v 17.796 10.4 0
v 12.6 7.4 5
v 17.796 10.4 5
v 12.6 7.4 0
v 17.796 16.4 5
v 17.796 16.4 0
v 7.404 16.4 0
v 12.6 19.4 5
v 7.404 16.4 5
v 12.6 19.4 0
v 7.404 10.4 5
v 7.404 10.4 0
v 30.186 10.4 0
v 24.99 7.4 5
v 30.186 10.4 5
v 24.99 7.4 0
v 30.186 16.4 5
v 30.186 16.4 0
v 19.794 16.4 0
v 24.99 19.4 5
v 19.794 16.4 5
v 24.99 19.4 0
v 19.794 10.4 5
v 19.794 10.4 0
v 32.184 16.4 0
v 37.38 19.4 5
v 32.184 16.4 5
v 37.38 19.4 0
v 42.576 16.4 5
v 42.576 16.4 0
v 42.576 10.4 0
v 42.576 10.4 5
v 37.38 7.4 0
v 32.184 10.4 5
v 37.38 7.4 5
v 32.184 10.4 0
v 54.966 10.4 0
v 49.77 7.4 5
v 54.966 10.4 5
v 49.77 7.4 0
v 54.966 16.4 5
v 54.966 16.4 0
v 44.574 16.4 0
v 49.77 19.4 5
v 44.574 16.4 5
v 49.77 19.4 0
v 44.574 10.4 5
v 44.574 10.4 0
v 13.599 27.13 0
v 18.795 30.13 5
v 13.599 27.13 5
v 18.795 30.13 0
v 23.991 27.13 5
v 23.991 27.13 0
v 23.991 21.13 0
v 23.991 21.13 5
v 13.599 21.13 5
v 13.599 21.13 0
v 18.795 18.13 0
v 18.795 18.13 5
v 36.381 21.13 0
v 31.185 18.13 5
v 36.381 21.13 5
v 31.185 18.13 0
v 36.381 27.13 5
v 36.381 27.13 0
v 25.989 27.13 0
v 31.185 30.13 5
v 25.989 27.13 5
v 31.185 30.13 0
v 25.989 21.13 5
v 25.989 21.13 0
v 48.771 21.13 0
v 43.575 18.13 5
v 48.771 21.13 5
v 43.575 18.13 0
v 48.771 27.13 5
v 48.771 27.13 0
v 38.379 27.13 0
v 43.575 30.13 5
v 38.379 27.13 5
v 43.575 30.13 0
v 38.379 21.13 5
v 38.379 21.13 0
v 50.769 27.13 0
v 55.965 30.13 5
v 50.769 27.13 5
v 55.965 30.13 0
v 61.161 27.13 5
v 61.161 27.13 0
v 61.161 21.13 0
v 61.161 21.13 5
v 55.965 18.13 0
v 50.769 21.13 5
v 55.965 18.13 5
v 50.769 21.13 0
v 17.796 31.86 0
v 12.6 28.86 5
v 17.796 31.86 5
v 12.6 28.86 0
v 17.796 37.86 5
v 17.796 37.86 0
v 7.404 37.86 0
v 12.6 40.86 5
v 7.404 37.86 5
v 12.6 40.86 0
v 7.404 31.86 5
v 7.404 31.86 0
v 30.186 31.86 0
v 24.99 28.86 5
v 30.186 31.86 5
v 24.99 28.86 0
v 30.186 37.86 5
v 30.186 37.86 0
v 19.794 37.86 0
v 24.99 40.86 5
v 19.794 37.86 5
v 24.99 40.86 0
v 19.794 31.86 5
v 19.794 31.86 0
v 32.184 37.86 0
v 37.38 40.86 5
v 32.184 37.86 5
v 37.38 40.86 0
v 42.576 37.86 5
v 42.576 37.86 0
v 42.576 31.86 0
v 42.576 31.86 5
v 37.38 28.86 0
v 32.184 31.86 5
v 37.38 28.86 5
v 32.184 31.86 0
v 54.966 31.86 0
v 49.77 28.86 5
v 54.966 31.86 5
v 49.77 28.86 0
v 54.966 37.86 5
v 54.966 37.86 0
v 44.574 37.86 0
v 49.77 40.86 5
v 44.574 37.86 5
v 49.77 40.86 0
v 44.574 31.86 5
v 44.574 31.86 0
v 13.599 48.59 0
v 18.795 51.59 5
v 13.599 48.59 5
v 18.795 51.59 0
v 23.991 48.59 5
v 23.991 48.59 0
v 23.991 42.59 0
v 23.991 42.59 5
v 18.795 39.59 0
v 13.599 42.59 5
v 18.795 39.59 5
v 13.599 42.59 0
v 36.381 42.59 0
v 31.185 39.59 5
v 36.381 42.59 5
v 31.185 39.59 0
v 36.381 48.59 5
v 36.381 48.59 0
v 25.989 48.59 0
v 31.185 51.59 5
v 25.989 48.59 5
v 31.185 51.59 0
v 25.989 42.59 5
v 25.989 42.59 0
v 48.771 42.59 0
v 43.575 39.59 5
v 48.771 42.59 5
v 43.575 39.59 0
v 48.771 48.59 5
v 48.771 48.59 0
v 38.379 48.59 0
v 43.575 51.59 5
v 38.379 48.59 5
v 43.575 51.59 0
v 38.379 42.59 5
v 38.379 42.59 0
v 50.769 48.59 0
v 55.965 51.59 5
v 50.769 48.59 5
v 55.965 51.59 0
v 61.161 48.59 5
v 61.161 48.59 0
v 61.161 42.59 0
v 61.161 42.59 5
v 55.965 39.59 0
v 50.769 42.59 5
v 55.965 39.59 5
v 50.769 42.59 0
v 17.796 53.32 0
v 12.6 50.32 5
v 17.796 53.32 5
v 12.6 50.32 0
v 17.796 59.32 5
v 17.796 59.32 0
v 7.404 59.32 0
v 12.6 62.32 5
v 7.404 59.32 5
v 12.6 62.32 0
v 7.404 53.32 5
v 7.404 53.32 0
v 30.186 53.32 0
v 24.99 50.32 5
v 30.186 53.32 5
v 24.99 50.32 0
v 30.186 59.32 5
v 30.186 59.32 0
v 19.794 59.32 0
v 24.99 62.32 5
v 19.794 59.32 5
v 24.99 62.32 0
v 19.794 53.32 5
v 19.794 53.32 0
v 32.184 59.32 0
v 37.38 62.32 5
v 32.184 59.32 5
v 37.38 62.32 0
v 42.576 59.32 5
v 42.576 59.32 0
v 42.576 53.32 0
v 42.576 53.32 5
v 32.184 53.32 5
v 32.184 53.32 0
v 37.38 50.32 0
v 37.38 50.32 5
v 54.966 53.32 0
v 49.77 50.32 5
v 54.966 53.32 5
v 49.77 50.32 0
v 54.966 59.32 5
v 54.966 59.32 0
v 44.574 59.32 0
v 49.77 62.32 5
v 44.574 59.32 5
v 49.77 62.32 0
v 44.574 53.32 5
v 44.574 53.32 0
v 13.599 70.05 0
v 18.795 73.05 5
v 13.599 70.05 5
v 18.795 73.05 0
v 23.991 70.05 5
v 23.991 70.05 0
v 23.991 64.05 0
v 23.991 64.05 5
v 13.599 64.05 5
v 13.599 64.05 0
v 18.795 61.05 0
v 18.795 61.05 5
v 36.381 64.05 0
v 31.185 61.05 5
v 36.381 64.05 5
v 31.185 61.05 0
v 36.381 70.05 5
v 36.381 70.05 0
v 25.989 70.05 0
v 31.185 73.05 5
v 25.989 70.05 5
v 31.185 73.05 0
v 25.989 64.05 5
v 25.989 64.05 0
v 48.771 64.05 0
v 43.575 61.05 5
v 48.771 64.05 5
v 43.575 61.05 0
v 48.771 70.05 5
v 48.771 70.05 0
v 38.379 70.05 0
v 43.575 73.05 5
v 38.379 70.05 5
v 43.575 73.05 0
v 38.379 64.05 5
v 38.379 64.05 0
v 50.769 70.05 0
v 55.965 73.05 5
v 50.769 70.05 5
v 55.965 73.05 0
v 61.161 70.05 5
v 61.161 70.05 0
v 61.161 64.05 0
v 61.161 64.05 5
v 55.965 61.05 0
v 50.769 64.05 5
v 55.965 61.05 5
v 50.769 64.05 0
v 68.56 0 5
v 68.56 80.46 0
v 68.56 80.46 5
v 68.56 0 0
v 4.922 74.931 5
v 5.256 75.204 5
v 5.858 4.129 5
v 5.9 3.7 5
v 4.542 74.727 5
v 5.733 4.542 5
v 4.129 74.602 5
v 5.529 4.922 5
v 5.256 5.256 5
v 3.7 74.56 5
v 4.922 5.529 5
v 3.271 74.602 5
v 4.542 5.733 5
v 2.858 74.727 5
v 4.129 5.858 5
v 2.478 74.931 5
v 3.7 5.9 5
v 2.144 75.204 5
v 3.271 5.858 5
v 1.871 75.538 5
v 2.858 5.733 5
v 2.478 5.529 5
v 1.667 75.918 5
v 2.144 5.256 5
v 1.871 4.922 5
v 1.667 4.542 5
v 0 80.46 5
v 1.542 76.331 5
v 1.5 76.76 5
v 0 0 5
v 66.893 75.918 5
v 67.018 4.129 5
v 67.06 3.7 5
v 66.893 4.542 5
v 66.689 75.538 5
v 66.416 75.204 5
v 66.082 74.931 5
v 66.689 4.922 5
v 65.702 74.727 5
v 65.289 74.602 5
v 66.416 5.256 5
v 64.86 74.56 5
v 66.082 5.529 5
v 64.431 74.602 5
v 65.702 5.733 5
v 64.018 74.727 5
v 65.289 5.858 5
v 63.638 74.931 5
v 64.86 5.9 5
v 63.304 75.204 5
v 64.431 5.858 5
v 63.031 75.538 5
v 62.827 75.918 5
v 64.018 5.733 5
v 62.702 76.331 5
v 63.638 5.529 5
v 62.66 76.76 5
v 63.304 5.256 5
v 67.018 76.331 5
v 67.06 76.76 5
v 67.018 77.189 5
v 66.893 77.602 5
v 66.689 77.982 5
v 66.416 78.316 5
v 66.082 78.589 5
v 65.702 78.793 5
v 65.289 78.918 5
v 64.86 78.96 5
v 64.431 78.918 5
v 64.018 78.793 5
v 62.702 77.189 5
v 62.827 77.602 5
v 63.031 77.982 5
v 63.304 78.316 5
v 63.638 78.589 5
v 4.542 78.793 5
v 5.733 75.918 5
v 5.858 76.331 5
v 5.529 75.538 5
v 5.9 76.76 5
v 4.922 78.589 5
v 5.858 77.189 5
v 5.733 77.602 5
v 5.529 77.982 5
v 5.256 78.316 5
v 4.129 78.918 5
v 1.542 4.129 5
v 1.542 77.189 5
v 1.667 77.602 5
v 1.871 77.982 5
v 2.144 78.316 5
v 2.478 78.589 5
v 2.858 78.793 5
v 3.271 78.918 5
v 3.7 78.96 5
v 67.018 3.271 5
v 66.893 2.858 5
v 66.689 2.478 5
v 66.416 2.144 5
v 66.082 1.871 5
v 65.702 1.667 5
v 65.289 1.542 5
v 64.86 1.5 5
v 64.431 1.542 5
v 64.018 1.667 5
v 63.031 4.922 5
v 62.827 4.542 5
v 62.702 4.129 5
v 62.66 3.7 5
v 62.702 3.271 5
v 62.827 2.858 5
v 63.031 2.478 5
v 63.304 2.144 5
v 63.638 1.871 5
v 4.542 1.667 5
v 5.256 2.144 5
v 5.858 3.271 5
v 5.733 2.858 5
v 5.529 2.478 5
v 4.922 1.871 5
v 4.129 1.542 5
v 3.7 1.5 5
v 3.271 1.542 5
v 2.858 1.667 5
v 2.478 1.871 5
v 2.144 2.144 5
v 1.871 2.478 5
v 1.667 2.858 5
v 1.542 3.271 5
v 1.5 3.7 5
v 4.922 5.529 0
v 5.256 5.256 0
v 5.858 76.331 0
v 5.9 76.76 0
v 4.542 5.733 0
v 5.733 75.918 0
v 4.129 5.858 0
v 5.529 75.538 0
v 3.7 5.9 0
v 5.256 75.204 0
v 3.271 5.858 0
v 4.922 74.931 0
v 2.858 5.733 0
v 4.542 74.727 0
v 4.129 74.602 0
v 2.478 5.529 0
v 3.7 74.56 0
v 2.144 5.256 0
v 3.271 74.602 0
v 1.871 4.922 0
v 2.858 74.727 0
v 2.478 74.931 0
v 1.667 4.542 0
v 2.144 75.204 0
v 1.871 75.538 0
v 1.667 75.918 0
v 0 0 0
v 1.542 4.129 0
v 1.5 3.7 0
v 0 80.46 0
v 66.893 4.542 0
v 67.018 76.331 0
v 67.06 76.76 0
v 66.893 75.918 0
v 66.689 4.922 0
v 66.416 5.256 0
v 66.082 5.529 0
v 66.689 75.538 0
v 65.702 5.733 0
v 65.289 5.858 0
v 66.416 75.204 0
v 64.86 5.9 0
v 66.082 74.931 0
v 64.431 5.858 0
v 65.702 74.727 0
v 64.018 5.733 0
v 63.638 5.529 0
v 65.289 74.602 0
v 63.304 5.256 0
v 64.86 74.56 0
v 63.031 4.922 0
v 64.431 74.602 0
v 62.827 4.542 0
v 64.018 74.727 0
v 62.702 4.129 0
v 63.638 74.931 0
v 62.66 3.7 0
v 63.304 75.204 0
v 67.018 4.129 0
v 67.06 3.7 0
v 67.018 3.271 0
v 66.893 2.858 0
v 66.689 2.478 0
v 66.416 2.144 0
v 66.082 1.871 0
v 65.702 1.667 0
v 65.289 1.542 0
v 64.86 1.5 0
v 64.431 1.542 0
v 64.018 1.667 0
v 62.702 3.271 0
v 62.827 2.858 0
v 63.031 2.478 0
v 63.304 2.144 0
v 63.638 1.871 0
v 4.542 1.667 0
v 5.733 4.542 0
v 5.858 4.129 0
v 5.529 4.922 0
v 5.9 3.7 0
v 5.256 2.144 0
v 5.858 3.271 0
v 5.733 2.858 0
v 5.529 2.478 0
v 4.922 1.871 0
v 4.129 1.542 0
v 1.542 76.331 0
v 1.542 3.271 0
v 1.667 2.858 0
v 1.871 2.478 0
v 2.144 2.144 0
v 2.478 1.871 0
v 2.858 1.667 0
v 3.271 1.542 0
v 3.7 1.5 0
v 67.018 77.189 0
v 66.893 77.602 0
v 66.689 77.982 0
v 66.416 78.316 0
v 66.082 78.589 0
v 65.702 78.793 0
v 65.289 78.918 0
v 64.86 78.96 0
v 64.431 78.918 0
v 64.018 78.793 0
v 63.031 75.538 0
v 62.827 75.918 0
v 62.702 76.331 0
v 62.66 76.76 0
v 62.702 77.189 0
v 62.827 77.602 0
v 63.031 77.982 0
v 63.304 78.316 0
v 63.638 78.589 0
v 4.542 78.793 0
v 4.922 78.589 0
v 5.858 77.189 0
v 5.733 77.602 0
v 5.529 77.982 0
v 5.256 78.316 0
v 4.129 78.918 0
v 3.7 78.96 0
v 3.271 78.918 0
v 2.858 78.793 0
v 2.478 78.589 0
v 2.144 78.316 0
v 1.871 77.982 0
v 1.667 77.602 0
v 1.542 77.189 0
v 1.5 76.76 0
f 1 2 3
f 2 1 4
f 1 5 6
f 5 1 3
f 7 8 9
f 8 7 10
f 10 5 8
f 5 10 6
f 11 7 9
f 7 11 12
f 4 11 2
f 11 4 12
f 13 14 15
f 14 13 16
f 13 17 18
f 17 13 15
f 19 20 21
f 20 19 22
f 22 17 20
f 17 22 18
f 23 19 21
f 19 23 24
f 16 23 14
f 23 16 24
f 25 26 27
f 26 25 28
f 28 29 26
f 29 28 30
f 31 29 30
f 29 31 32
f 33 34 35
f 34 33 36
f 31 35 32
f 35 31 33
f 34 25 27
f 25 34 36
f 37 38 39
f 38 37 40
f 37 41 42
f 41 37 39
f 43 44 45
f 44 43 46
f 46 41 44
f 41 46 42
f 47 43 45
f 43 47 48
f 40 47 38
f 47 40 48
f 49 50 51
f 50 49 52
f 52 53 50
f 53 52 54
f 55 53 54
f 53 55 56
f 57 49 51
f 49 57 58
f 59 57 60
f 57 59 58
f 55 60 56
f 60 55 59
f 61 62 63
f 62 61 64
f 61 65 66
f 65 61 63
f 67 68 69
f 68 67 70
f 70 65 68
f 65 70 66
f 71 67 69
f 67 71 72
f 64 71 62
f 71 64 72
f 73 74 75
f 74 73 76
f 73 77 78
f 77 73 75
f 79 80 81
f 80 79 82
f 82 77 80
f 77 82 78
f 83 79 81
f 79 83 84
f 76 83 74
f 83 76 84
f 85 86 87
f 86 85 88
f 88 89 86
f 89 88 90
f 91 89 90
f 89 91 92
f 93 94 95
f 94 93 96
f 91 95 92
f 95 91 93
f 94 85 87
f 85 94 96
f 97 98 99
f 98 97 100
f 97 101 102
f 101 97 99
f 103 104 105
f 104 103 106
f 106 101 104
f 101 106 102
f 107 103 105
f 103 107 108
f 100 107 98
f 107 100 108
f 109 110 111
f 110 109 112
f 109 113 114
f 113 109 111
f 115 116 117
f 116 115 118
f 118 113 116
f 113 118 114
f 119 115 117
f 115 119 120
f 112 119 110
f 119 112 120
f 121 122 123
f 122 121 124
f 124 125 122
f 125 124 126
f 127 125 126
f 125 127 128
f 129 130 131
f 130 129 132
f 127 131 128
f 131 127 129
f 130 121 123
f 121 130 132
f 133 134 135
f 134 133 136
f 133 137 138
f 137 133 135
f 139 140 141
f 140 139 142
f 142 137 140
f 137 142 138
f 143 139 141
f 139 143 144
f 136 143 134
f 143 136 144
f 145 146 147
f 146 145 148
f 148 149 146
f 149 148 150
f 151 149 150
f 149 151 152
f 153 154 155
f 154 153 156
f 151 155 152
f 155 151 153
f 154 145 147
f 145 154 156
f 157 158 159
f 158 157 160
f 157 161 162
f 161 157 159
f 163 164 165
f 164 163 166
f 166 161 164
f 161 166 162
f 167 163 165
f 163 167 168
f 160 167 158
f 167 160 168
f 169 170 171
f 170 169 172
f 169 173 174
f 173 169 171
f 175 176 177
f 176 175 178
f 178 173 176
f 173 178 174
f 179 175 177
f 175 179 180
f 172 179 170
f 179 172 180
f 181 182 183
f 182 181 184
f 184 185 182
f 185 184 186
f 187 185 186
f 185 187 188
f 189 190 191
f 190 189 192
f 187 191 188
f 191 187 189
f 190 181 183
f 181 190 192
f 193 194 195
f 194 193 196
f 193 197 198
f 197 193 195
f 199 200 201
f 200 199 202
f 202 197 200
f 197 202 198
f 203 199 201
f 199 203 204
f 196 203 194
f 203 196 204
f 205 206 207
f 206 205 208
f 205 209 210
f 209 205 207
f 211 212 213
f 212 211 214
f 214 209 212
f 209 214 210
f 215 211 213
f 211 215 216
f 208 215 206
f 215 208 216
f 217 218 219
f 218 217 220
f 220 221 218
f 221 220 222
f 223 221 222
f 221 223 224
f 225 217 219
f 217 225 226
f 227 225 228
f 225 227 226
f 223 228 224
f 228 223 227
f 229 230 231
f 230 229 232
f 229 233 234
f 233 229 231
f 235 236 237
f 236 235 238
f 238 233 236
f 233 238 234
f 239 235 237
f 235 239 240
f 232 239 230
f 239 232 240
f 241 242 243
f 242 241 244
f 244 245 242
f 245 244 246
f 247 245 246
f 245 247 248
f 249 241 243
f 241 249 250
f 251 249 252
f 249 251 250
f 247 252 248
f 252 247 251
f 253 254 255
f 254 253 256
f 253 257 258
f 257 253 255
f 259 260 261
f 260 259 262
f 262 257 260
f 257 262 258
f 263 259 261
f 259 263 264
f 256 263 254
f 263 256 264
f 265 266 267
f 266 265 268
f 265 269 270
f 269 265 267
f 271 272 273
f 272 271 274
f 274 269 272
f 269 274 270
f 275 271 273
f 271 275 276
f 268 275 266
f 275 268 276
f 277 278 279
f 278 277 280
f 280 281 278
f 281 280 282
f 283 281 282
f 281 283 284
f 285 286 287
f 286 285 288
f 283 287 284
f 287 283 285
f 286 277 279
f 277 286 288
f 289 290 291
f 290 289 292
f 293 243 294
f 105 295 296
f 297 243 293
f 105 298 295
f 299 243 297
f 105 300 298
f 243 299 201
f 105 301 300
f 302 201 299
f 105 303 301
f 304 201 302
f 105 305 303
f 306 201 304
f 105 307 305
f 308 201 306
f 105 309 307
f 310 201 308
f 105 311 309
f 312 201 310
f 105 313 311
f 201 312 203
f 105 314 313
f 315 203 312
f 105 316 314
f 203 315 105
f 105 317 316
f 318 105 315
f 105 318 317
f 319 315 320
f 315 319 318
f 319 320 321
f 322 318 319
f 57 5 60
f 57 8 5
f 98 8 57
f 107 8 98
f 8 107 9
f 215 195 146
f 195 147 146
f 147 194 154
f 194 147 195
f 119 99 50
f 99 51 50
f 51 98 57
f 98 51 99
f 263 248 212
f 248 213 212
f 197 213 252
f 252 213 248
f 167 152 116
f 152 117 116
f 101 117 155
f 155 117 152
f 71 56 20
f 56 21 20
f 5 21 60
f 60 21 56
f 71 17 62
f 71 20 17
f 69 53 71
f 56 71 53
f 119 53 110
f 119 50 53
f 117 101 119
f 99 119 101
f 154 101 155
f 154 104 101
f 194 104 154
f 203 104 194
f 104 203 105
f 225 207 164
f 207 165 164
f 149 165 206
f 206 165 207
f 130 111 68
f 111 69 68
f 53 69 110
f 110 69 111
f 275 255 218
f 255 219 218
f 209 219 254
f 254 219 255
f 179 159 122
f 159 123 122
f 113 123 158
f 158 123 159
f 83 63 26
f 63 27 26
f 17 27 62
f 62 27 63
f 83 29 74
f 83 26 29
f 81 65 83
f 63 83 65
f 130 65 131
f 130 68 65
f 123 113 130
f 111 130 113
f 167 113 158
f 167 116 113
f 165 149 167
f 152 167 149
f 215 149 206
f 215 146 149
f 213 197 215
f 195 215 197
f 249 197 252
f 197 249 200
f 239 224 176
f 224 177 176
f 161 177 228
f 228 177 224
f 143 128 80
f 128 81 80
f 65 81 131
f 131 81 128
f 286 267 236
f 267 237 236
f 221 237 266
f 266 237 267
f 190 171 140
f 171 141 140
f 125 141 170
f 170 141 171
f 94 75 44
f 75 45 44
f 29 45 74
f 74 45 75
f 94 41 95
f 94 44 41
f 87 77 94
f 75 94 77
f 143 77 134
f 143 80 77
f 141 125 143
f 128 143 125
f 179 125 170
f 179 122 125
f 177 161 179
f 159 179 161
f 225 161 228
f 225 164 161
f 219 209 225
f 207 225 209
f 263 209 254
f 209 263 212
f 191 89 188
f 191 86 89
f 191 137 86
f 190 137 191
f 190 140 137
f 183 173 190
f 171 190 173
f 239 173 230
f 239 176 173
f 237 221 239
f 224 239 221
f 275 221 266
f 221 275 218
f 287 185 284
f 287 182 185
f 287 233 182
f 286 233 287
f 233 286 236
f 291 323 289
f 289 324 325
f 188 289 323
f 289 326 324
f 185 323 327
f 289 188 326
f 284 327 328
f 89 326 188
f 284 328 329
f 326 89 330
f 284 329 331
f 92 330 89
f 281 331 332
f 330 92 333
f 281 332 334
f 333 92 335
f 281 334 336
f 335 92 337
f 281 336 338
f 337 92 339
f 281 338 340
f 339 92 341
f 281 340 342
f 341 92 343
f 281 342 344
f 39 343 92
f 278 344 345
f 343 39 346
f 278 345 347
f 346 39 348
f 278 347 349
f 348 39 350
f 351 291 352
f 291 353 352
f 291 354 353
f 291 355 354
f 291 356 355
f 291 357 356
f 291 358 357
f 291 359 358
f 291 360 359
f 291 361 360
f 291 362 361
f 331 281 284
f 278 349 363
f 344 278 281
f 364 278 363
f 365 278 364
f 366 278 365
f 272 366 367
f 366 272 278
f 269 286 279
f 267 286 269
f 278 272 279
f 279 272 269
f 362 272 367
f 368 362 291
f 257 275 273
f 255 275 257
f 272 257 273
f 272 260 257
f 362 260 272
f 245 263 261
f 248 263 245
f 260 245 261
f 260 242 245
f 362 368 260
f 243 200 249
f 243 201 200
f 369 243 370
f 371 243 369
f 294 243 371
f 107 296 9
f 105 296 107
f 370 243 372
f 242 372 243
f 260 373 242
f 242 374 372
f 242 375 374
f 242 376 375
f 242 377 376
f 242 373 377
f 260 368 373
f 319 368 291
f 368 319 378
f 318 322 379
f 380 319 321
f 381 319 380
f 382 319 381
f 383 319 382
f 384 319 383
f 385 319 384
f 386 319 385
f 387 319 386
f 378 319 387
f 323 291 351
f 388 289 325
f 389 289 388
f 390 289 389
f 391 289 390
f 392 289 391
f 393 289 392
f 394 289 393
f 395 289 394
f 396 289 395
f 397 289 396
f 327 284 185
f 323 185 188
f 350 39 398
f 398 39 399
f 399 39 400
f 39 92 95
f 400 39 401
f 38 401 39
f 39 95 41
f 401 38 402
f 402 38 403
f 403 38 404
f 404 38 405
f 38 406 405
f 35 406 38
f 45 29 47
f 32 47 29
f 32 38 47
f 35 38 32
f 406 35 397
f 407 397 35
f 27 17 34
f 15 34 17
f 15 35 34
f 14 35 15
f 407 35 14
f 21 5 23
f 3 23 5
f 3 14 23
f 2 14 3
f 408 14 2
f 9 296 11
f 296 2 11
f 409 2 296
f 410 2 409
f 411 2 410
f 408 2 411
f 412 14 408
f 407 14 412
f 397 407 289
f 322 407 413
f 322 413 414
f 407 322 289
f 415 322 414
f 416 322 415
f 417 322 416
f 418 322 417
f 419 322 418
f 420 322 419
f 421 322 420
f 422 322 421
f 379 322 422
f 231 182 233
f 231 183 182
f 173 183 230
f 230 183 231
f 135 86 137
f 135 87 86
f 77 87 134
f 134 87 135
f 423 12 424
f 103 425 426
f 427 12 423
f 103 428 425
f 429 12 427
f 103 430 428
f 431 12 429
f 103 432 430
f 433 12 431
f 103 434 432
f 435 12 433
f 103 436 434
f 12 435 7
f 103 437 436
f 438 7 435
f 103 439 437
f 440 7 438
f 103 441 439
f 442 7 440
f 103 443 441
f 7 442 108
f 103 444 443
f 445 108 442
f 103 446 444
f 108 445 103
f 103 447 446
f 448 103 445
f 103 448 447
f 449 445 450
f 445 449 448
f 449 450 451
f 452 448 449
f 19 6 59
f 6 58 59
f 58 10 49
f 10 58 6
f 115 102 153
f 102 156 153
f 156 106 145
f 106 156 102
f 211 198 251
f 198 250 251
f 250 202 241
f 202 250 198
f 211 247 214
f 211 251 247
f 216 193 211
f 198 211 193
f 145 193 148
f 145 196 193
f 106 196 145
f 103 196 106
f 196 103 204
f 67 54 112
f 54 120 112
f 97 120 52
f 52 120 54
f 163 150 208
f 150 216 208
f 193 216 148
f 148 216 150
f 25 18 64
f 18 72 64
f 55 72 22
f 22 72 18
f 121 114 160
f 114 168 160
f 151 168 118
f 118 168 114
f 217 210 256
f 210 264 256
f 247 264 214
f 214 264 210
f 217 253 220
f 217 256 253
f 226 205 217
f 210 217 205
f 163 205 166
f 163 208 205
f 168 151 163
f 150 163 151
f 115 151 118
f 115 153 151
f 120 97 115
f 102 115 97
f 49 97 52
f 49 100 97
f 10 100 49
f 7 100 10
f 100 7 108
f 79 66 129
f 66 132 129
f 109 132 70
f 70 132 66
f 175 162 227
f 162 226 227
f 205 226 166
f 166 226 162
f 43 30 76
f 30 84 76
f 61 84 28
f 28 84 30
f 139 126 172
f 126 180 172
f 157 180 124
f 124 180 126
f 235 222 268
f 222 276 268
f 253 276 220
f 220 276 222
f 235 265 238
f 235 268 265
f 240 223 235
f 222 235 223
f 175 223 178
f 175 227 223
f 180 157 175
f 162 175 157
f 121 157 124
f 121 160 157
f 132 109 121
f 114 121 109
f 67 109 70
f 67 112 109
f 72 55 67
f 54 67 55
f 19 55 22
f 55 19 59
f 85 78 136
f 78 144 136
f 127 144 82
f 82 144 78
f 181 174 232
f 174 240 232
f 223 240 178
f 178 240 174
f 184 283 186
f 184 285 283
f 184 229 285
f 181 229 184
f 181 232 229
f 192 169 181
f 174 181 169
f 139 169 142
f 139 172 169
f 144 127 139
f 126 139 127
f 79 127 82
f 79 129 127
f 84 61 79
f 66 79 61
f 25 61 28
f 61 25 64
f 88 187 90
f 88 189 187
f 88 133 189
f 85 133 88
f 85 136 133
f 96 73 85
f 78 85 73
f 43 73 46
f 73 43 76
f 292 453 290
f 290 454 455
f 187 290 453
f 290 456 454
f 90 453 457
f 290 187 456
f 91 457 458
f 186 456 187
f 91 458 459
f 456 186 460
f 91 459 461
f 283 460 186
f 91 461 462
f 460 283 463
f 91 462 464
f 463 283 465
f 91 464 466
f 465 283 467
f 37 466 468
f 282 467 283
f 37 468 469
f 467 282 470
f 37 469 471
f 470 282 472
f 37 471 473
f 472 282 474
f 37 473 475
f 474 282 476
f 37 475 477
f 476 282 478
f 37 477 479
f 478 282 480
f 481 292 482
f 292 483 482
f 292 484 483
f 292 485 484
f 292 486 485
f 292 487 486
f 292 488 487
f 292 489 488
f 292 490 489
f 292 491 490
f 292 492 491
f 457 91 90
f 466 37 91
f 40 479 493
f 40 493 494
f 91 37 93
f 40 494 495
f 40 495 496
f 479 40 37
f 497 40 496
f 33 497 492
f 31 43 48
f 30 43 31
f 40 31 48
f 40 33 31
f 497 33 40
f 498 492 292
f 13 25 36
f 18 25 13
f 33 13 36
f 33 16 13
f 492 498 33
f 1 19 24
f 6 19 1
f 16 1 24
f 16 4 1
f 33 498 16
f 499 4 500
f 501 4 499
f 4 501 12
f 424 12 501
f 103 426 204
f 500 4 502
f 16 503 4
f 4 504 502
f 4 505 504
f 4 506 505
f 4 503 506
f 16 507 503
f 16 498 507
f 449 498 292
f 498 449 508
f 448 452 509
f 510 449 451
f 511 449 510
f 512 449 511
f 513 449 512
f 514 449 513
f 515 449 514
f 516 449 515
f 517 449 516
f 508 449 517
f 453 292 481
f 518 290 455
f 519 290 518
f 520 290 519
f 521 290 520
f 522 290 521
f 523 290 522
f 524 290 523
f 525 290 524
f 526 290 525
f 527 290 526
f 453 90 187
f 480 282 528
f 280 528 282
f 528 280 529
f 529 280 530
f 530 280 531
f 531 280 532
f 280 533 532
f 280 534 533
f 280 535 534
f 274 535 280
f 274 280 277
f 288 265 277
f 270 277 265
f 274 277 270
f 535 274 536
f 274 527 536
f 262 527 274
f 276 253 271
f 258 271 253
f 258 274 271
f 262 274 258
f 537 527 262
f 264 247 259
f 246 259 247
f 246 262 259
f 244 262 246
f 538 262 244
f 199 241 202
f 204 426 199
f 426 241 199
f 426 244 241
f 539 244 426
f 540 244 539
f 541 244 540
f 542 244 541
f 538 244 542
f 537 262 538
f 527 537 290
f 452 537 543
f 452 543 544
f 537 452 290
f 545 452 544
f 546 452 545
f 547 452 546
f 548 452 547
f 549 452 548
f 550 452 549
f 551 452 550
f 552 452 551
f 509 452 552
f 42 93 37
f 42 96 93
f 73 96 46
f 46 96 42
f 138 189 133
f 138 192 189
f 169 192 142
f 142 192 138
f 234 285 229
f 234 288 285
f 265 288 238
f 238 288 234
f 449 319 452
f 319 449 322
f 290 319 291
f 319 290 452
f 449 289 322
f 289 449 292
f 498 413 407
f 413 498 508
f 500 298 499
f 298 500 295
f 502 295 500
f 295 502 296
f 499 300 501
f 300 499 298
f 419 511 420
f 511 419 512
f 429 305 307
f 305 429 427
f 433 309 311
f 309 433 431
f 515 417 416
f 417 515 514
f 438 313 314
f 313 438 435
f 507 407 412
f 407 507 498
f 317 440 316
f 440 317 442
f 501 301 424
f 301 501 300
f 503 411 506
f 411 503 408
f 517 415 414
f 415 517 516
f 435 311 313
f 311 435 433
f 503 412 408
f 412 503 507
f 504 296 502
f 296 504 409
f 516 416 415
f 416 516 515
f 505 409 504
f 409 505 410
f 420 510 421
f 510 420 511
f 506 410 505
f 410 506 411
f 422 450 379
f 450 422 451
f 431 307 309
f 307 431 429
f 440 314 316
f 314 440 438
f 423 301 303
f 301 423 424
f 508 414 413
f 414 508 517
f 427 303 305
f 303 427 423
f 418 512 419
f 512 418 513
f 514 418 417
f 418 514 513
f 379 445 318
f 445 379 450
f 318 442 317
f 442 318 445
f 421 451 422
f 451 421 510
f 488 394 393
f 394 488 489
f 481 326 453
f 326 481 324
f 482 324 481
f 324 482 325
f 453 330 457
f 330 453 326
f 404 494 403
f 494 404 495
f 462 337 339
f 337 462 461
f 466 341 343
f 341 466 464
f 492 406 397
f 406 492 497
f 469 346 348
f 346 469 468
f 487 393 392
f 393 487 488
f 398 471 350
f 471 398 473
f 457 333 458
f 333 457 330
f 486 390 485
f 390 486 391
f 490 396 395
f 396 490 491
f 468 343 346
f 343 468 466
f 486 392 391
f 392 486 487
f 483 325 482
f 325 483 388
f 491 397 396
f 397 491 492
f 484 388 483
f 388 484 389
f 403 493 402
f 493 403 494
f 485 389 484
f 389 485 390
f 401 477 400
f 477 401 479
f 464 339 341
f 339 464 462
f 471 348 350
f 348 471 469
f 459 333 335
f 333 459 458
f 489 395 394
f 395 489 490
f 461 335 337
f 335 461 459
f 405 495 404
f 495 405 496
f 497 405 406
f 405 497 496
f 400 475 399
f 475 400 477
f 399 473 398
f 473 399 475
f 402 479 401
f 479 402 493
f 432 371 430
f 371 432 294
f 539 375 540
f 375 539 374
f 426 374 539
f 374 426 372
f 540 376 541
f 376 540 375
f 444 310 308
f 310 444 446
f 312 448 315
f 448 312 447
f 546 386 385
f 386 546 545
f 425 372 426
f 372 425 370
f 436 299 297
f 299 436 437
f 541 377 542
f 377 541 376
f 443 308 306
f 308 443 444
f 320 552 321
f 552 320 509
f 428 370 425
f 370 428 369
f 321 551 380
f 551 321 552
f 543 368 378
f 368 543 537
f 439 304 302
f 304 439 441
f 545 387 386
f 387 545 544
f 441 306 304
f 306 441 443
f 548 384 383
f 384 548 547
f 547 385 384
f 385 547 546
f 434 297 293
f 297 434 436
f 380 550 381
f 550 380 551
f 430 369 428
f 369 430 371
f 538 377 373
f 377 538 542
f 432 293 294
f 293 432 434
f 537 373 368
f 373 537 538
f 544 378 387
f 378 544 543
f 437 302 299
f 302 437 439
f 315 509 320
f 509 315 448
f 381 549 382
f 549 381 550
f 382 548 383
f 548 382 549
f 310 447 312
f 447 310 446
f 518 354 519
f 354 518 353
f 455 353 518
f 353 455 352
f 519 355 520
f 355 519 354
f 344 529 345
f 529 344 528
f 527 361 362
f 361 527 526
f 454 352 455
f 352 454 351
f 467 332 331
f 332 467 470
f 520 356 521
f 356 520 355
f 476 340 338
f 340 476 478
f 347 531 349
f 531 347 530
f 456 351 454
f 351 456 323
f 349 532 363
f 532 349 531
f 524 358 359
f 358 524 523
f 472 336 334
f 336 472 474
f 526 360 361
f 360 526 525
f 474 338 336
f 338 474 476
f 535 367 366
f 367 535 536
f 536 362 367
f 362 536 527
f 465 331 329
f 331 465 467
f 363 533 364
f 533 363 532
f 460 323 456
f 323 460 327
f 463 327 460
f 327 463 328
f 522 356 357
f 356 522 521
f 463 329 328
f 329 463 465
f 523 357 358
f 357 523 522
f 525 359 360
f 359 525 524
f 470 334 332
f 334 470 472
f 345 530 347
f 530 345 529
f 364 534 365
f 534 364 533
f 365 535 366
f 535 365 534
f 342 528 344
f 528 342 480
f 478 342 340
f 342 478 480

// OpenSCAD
$fn = 32;

// ----------------------------------------------------------------------
// Honeycomb panel: 68.56 x 80.46 mm, 24 cells of 12 mm
// ----------------------------------------------------------------------

// --- parameters (mm) ---
panel_w = 68.56;          // panel width
panel_d = 80.46;          // panel depth
thick = 5;                // panel thickness
cell_r = 6;               // hex cell circumradius
pitch = 12.39;            // hex cell pitch (centre to centre)
web = 2;                  // web between the cells
columns = 4;              // columns of cells
rows = 6;                 // rows of cells
cell_count = 24;          // total cells
shift_x = 12.6;           // first cell offset in x
shift_y = 13.4;           // first cell offset in y
mount_d = 4.4;            // corner mounting holes
hole_off = 3.7;           // mounting hole offset from the corners

difference() {
  union() {
    cube([panel_w, panel_d, thick]);
  }
  /* hexagonal cells, point-up, cut right through the plate */
  for (row = [0 : rows - 1]) {
    for (col = [0 : columns - 1]) {
      translate([shift_x + col * pitch + (row % 2) * pitch / 2, shift_y + row * pitch * 0.866025, -2.5]) rotate([0, 0, 30]) cylinder(h = thick + 5, d = 2 * cell_r, $fn = 6);
    }
  }
  /* corner mounting holes, clear of the outer cell web */
  translate([3.7, 3.7, -2.5]) cylinder(h = thick + 5, d = mount_d);
  translate([64.86, 3.7, -2.5]) cylinder(h = thick + 5, d = mount_d);
  translate([3.7, 76.76, -2.5]) cylinder(h = thick + 5, d = mount_d);
  translate([64.86, 76.76, -2.5]) cylinder(h = thick + 5, d = mount_d);
}
